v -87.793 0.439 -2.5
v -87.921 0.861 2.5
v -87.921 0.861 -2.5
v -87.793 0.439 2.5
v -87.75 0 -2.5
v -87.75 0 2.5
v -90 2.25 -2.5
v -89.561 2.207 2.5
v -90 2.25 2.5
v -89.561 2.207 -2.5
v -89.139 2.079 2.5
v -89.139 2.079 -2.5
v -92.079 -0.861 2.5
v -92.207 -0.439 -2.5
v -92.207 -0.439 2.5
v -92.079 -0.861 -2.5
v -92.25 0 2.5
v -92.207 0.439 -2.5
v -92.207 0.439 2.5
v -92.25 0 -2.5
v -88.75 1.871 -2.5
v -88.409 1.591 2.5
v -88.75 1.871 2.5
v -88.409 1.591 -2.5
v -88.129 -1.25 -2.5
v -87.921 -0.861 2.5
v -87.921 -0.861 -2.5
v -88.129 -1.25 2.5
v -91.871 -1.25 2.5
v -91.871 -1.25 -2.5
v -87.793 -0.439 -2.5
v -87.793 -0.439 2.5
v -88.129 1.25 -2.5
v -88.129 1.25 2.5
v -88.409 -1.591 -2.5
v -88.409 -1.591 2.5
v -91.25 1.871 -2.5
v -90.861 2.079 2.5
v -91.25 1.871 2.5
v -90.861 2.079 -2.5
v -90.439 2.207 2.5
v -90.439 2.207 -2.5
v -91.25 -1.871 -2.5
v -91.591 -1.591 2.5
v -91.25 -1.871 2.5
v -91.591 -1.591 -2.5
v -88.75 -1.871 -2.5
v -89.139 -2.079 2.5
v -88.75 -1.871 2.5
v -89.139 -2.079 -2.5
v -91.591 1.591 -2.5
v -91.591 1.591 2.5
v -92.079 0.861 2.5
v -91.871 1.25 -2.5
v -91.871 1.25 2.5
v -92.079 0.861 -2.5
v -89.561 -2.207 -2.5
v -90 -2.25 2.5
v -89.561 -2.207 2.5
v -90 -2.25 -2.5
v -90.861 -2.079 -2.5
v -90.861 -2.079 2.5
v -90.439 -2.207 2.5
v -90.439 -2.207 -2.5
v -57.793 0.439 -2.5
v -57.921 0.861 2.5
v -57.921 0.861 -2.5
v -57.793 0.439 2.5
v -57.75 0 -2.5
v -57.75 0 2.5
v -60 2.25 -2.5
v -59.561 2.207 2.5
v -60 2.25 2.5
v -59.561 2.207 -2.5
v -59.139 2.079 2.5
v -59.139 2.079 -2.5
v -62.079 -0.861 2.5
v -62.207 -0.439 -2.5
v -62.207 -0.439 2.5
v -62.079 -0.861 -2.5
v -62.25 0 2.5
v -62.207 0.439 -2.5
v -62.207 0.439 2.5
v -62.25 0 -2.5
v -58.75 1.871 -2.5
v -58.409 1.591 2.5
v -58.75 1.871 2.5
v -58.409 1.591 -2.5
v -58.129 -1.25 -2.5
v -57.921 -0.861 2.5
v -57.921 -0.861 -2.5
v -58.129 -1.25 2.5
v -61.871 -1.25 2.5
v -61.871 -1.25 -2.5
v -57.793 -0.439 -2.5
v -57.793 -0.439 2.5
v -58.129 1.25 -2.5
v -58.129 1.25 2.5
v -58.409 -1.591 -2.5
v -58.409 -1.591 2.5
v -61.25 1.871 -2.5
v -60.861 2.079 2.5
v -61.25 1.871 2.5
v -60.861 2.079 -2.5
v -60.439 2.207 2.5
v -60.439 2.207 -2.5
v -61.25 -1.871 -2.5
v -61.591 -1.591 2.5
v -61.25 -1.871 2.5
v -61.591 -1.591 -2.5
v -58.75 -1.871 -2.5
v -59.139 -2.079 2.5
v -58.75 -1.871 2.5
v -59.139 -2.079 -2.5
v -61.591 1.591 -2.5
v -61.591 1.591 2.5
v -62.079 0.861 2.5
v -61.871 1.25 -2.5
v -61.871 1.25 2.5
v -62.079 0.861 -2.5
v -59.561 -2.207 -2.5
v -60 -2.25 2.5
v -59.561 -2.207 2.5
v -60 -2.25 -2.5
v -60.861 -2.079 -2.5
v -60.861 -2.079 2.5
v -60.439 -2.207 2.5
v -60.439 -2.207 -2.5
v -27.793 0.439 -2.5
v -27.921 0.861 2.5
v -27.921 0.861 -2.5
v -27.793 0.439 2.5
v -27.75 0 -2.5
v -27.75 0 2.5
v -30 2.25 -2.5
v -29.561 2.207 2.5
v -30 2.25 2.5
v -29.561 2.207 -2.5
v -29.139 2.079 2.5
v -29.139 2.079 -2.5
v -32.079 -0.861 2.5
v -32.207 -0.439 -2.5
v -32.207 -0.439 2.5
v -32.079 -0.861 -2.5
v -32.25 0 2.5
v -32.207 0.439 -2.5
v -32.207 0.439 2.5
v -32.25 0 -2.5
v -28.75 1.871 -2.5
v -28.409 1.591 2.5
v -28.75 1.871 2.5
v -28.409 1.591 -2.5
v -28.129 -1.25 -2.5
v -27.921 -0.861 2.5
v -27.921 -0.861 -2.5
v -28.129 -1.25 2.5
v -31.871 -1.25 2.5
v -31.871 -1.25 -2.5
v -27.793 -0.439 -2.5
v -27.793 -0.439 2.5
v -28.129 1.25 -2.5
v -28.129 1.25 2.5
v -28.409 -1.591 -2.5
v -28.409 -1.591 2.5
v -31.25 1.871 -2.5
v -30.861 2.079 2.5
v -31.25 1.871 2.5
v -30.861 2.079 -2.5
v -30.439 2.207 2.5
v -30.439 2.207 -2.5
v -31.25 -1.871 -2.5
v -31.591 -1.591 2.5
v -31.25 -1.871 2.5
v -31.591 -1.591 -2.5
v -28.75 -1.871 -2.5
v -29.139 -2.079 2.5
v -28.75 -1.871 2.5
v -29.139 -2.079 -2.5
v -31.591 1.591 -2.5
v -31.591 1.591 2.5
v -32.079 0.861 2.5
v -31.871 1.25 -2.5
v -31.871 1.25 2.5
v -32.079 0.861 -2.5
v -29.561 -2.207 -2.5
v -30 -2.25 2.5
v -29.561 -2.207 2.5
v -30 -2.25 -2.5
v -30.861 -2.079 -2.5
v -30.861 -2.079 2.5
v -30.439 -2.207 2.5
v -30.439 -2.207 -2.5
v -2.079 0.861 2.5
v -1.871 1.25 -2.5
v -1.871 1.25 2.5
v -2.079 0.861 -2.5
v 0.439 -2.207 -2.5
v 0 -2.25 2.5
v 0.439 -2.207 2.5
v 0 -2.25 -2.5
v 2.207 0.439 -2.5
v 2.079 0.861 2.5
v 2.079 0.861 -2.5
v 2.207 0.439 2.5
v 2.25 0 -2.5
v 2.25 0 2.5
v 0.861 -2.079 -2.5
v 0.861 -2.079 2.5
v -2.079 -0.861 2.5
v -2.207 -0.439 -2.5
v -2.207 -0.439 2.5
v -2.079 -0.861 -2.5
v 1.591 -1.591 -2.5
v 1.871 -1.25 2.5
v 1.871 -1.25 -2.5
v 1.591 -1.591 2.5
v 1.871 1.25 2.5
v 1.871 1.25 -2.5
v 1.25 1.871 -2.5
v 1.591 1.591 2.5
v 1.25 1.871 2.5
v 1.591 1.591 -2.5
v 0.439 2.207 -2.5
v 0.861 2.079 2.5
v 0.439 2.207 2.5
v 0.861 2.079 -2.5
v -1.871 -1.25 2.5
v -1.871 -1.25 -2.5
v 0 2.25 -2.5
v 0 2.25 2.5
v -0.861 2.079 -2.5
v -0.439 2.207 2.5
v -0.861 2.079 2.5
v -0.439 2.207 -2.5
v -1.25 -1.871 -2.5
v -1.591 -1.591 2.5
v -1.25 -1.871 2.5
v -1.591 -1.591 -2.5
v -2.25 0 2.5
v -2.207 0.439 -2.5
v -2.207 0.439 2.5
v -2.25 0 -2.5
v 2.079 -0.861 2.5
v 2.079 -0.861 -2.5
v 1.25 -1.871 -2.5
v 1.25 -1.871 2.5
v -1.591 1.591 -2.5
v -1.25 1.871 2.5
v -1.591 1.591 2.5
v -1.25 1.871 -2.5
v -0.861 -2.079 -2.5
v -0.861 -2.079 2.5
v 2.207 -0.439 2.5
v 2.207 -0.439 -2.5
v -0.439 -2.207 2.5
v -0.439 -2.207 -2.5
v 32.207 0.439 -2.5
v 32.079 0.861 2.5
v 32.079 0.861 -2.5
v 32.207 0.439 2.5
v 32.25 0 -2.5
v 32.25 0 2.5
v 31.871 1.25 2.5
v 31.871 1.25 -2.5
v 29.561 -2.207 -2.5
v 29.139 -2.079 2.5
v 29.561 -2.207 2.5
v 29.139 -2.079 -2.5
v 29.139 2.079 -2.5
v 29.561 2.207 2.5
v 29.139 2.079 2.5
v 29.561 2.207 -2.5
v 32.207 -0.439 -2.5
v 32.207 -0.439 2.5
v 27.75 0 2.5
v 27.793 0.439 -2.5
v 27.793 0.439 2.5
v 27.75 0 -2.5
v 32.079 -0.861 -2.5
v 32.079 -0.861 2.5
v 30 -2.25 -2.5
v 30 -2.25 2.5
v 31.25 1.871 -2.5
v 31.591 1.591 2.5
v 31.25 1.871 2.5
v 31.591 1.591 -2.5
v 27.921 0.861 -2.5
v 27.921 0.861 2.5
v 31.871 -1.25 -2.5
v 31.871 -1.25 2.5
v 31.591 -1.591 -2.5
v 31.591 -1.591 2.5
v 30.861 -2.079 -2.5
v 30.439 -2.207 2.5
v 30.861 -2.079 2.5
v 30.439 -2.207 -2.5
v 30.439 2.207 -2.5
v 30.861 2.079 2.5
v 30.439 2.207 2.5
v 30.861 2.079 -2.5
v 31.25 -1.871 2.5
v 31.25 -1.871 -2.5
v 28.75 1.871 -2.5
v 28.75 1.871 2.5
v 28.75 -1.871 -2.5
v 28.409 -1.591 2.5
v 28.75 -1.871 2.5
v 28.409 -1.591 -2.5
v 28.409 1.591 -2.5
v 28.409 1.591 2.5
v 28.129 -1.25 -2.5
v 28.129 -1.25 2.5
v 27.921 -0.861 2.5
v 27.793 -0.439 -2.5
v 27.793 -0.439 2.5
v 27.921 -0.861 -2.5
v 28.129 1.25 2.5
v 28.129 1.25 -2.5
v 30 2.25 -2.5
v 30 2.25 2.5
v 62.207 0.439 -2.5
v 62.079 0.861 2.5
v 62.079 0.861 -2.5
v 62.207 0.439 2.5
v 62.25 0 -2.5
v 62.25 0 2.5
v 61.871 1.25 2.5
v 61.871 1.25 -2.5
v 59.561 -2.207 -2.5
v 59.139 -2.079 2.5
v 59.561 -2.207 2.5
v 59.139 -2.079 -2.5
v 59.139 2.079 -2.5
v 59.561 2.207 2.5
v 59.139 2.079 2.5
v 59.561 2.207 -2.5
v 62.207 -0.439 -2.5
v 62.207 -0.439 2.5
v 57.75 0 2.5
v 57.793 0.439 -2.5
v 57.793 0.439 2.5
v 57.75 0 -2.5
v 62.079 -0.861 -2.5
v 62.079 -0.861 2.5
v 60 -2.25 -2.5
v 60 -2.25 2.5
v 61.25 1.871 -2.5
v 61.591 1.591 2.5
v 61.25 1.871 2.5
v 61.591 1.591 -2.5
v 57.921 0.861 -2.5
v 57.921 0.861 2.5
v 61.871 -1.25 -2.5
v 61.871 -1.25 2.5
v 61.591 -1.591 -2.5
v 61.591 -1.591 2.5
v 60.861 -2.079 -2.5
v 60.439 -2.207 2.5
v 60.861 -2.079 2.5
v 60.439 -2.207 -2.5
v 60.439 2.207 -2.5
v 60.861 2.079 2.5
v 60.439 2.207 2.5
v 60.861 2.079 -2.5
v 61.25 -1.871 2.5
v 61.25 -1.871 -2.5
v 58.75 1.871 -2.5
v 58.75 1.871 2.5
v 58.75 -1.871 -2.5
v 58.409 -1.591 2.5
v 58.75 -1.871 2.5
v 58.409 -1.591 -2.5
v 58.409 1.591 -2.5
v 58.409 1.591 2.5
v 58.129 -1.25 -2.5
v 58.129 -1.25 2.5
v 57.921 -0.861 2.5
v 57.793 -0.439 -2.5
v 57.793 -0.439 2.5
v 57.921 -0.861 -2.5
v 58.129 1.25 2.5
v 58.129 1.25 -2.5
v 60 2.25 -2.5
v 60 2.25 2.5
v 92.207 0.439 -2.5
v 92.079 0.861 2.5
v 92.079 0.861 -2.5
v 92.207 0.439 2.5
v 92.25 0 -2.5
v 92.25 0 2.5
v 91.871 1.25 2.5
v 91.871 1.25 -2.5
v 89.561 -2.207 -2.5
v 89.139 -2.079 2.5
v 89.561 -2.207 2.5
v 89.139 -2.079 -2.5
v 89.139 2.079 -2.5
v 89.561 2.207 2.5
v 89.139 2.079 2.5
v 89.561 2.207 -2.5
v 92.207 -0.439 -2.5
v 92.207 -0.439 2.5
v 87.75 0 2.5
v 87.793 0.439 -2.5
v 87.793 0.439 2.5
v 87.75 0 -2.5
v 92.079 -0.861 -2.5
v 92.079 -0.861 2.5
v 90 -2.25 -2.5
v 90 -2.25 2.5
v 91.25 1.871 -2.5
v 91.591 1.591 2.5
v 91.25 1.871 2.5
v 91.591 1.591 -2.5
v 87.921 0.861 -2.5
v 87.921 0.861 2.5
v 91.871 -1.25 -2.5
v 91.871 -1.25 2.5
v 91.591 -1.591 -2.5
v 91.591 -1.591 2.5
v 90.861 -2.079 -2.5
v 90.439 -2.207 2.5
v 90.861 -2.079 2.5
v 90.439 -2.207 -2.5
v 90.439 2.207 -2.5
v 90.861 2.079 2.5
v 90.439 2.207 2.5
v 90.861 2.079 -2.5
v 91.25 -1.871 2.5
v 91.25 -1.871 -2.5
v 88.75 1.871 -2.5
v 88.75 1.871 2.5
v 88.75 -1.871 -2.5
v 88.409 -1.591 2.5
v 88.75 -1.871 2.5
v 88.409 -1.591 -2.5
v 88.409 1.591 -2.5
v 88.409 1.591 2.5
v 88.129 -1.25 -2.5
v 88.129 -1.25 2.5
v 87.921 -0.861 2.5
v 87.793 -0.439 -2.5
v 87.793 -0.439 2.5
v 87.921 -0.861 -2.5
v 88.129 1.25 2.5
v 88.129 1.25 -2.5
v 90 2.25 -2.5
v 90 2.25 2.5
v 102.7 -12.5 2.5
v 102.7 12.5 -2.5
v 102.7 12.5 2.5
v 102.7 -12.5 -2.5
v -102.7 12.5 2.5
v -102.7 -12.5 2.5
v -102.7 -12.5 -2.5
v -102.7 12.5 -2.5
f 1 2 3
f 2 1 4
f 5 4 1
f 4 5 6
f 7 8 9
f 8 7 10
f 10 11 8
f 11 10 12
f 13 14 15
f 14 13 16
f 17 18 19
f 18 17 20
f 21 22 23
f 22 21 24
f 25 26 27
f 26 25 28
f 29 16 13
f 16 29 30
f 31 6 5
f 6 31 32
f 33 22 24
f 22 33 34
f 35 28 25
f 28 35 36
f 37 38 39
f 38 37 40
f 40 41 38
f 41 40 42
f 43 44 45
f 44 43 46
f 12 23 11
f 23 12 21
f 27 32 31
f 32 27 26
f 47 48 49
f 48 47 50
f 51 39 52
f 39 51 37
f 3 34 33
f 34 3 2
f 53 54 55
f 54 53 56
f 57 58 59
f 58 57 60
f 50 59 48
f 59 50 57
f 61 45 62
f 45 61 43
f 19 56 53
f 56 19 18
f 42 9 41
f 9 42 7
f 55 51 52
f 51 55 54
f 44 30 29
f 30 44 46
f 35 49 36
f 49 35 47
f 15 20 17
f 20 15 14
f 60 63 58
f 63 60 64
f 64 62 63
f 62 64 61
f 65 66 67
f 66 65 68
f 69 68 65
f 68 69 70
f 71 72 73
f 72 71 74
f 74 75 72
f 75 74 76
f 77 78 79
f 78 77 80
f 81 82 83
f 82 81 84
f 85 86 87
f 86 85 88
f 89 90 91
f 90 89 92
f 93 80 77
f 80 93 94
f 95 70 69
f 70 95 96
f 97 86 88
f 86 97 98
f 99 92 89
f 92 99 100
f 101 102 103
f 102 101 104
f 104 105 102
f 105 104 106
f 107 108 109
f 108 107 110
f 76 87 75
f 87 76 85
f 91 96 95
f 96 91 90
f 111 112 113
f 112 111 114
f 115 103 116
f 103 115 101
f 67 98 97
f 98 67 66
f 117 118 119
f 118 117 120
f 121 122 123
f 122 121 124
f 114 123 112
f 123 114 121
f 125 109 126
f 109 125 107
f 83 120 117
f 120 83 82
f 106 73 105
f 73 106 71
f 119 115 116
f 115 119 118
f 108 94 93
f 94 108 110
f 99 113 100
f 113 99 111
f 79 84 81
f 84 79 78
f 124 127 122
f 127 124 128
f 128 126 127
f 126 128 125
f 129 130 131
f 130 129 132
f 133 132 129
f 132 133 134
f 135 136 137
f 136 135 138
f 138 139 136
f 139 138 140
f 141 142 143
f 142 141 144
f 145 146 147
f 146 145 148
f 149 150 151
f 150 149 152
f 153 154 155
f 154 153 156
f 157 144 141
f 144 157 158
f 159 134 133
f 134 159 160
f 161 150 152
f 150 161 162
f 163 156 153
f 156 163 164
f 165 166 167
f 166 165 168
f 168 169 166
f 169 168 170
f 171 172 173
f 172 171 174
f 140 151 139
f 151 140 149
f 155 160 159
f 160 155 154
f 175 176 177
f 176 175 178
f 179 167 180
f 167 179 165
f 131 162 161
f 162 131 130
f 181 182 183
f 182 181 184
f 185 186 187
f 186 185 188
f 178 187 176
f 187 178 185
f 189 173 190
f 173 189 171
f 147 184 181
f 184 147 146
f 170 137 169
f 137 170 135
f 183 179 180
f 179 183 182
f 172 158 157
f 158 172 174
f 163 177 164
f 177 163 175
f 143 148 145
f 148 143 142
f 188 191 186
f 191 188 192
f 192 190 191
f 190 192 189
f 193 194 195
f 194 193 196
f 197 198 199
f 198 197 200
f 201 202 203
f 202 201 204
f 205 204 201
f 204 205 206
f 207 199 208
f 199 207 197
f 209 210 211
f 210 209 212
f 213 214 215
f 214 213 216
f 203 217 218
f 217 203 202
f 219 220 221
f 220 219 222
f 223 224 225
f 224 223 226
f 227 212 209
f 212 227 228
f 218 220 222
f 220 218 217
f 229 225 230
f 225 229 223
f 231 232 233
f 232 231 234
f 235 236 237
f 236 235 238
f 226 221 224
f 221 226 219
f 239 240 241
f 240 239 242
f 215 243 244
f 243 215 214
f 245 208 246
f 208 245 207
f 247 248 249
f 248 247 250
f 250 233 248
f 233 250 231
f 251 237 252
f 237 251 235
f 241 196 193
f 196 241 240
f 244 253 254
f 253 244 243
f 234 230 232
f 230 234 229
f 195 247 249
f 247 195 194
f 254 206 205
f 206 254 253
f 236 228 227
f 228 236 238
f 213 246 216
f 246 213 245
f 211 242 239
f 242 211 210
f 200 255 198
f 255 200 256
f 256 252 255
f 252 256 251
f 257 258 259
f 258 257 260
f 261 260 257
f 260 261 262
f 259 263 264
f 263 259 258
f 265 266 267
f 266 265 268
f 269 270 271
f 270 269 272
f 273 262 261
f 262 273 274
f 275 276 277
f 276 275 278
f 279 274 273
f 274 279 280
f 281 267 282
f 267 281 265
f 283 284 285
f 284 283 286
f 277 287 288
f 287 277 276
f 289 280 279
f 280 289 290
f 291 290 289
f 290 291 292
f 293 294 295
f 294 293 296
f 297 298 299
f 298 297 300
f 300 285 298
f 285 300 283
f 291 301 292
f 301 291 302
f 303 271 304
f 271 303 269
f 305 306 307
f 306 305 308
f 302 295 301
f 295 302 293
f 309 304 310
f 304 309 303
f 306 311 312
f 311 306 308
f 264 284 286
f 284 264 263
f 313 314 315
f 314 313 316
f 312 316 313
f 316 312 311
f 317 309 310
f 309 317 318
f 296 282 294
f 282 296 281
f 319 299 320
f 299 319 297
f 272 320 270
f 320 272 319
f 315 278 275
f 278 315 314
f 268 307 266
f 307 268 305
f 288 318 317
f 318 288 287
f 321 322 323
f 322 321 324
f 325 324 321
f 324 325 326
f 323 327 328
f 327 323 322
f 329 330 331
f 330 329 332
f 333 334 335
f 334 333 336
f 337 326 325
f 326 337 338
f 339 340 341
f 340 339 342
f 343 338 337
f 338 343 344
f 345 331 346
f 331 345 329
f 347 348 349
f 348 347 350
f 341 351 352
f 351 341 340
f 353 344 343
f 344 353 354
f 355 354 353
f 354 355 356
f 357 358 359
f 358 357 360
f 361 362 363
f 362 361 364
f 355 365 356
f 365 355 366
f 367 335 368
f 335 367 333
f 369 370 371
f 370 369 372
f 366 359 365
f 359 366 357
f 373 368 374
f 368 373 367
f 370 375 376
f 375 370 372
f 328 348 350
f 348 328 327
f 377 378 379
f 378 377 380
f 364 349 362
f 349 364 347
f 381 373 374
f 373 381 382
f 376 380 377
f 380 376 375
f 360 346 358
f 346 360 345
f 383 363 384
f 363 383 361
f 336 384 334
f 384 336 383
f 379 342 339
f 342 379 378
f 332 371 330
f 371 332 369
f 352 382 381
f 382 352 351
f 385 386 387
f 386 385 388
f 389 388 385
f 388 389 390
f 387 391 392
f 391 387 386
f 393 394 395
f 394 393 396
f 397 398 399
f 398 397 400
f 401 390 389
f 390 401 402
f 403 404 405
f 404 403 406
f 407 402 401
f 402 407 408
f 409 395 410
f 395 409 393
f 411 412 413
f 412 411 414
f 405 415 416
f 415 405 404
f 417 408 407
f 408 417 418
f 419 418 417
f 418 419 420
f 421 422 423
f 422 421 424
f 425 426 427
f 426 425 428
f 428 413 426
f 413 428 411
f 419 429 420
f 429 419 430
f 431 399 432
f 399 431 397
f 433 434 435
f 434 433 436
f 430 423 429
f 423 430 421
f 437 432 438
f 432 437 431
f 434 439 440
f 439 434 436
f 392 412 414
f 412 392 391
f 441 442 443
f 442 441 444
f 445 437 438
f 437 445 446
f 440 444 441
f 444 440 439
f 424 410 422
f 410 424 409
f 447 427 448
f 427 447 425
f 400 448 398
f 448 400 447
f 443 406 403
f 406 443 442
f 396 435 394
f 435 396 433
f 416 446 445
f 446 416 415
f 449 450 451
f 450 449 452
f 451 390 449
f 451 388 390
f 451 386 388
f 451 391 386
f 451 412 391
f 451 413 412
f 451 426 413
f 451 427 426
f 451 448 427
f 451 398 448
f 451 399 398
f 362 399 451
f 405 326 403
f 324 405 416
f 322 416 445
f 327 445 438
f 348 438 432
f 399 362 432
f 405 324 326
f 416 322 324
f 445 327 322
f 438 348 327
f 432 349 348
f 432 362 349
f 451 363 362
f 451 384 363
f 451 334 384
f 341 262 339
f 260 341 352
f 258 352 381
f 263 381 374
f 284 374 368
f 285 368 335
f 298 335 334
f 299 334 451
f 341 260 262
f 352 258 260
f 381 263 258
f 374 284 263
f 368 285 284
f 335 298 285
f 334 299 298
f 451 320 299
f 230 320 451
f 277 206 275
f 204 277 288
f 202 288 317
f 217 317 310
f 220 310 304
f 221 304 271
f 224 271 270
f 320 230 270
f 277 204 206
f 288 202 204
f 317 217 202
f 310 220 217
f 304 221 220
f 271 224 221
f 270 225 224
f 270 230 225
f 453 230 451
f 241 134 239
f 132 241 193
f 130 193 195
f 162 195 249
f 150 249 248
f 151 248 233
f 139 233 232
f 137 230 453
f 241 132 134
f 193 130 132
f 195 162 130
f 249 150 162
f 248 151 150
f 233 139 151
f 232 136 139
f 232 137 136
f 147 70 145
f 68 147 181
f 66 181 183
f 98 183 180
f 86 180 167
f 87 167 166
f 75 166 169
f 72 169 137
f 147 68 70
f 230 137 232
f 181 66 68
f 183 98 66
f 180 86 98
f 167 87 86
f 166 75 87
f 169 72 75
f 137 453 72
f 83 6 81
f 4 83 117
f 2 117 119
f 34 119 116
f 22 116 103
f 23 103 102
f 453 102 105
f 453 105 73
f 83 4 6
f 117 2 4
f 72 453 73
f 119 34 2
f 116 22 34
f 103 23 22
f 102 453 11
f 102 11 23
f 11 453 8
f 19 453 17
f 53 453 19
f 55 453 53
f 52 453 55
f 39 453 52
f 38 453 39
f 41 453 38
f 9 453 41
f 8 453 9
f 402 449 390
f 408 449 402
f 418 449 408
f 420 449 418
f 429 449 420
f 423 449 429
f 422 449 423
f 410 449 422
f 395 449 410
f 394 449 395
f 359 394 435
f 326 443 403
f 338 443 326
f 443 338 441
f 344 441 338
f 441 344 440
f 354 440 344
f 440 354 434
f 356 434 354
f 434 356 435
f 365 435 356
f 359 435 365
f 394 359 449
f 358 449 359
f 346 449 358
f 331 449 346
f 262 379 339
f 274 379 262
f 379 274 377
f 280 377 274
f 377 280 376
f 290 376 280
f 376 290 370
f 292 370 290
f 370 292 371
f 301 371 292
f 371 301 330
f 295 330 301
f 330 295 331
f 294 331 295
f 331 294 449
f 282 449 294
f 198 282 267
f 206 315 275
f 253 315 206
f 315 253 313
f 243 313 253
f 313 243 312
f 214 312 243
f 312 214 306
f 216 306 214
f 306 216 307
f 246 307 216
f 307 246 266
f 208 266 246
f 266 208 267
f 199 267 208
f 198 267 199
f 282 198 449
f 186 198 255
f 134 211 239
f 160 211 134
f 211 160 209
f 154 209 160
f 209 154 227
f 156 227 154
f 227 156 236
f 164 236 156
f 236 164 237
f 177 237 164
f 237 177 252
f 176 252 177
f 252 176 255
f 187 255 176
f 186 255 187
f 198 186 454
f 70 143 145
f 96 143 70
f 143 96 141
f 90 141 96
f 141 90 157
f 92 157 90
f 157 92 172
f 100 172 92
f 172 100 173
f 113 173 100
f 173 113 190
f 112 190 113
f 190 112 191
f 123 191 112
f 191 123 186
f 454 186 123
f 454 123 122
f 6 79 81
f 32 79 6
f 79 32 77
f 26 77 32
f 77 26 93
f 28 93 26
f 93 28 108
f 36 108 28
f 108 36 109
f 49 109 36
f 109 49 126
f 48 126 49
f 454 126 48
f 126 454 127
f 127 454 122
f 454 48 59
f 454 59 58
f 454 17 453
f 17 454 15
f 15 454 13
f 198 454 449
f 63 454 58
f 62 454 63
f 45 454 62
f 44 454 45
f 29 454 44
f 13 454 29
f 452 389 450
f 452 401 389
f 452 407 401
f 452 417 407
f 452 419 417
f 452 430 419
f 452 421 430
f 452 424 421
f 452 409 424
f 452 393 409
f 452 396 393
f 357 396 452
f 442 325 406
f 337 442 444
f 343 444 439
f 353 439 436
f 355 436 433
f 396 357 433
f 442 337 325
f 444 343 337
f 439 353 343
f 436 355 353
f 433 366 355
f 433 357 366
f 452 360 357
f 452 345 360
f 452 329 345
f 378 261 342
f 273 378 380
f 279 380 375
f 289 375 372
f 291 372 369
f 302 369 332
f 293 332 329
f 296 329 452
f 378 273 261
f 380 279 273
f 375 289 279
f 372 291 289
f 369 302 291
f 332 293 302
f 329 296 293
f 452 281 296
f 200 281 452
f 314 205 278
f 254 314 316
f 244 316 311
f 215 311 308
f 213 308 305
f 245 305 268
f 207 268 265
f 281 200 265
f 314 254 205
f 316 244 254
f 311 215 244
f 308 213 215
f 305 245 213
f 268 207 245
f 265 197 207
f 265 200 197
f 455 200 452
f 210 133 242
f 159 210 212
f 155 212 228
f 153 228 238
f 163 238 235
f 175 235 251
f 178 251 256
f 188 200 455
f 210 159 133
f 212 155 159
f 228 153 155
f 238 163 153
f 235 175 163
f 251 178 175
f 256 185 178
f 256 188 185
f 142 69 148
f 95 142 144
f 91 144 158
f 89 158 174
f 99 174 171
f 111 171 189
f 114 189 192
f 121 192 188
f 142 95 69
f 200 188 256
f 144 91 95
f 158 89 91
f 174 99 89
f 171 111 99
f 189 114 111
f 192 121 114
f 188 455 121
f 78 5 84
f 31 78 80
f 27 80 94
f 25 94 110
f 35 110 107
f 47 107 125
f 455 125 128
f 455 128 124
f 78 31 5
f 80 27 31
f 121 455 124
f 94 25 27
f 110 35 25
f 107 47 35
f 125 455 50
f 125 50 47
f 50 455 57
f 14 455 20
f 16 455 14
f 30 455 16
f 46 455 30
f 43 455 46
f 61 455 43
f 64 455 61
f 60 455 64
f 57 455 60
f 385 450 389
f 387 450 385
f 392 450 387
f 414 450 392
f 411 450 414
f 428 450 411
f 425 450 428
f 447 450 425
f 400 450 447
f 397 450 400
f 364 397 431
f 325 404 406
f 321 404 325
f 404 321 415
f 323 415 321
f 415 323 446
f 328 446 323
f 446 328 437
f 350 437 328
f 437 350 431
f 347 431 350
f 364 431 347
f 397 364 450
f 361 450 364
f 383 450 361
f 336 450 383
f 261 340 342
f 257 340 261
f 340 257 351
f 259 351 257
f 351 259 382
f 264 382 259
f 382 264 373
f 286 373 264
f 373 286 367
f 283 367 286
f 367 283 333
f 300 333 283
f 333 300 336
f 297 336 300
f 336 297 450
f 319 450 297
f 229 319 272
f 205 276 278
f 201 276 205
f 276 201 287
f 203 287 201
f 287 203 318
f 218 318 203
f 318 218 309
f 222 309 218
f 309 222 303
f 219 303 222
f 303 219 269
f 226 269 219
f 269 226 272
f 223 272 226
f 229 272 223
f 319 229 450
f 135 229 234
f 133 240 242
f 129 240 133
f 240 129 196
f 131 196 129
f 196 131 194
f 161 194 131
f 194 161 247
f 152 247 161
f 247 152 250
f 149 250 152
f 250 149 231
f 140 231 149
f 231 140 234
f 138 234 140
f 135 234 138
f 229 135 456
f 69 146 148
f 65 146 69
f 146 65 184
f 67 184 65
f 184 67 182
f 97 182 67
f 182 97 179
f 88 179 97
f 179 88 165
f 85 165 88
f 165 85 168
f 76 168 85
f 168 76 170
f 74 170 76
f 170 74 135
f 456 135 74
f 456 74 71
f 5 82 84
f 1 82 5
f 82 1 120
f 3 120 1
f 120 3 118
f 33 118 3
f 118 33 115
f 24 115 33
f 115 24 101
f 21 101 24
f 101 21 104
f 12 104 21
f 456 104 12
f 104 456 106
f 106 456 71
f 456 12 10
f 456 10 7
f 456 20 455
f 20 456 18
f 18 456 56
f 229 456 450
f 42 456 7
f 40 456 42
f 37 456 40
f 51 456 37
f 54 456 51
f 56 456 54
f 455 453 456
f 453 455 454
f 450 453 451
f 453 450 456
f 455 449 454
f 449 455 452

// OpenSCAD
$fn = 32;

// ----------------------------------------------------------------------
// Hole bar, 7 x Ø4.5
// row layout, 12.7 mm edge offset
// ----------------------------------------------------------------------

// --- parameters (mm) ---
bar_w = 25;    // bar width (Y)
bar_t = 5;     // bar thickness (Z)
holes = 7;     // holes per row
hole_d = 4.5;  // hole diameter
edge = 12.7;   // offset from the bar end to the first hole
pitch = 30;    // pitch between neighbouring holes

// --- derived feature positions (mm) ---
span = (holes - 1) * pitch;   // = 180   distance between the end holes
bar_l = span + 2 * edge;      // = 205.4   overall bar length
start_x = -bar_l / 2 + edge;  // = -90   X of the first hole
feature_centers = [
  [start_x + 0 * pitch, 0],
  [start_x + 1 * pitch, 0],
  [start_x + 2 * pitch, 0],
  [start_x + 3 * pitch, 0],
  [start_x + 4 * pitch, 0],
  [start_x + 5 * pitch, 0],
  [start_x + 6 * pitch, 0]
];   // hole centres of the first row

// bar with one row of holes, drilled from feature_centers
difference() {
  translate([-bar_l / 2, -bar_w / 2, -bar_t / 2]) cube([bar_l, bar_w, bar_t]);
  for (centre = feature_centers)
    translate([centre[0], centre[1], 0])
      cylinder(d = hole_d, h = bar_t + 2, center = true);
}
